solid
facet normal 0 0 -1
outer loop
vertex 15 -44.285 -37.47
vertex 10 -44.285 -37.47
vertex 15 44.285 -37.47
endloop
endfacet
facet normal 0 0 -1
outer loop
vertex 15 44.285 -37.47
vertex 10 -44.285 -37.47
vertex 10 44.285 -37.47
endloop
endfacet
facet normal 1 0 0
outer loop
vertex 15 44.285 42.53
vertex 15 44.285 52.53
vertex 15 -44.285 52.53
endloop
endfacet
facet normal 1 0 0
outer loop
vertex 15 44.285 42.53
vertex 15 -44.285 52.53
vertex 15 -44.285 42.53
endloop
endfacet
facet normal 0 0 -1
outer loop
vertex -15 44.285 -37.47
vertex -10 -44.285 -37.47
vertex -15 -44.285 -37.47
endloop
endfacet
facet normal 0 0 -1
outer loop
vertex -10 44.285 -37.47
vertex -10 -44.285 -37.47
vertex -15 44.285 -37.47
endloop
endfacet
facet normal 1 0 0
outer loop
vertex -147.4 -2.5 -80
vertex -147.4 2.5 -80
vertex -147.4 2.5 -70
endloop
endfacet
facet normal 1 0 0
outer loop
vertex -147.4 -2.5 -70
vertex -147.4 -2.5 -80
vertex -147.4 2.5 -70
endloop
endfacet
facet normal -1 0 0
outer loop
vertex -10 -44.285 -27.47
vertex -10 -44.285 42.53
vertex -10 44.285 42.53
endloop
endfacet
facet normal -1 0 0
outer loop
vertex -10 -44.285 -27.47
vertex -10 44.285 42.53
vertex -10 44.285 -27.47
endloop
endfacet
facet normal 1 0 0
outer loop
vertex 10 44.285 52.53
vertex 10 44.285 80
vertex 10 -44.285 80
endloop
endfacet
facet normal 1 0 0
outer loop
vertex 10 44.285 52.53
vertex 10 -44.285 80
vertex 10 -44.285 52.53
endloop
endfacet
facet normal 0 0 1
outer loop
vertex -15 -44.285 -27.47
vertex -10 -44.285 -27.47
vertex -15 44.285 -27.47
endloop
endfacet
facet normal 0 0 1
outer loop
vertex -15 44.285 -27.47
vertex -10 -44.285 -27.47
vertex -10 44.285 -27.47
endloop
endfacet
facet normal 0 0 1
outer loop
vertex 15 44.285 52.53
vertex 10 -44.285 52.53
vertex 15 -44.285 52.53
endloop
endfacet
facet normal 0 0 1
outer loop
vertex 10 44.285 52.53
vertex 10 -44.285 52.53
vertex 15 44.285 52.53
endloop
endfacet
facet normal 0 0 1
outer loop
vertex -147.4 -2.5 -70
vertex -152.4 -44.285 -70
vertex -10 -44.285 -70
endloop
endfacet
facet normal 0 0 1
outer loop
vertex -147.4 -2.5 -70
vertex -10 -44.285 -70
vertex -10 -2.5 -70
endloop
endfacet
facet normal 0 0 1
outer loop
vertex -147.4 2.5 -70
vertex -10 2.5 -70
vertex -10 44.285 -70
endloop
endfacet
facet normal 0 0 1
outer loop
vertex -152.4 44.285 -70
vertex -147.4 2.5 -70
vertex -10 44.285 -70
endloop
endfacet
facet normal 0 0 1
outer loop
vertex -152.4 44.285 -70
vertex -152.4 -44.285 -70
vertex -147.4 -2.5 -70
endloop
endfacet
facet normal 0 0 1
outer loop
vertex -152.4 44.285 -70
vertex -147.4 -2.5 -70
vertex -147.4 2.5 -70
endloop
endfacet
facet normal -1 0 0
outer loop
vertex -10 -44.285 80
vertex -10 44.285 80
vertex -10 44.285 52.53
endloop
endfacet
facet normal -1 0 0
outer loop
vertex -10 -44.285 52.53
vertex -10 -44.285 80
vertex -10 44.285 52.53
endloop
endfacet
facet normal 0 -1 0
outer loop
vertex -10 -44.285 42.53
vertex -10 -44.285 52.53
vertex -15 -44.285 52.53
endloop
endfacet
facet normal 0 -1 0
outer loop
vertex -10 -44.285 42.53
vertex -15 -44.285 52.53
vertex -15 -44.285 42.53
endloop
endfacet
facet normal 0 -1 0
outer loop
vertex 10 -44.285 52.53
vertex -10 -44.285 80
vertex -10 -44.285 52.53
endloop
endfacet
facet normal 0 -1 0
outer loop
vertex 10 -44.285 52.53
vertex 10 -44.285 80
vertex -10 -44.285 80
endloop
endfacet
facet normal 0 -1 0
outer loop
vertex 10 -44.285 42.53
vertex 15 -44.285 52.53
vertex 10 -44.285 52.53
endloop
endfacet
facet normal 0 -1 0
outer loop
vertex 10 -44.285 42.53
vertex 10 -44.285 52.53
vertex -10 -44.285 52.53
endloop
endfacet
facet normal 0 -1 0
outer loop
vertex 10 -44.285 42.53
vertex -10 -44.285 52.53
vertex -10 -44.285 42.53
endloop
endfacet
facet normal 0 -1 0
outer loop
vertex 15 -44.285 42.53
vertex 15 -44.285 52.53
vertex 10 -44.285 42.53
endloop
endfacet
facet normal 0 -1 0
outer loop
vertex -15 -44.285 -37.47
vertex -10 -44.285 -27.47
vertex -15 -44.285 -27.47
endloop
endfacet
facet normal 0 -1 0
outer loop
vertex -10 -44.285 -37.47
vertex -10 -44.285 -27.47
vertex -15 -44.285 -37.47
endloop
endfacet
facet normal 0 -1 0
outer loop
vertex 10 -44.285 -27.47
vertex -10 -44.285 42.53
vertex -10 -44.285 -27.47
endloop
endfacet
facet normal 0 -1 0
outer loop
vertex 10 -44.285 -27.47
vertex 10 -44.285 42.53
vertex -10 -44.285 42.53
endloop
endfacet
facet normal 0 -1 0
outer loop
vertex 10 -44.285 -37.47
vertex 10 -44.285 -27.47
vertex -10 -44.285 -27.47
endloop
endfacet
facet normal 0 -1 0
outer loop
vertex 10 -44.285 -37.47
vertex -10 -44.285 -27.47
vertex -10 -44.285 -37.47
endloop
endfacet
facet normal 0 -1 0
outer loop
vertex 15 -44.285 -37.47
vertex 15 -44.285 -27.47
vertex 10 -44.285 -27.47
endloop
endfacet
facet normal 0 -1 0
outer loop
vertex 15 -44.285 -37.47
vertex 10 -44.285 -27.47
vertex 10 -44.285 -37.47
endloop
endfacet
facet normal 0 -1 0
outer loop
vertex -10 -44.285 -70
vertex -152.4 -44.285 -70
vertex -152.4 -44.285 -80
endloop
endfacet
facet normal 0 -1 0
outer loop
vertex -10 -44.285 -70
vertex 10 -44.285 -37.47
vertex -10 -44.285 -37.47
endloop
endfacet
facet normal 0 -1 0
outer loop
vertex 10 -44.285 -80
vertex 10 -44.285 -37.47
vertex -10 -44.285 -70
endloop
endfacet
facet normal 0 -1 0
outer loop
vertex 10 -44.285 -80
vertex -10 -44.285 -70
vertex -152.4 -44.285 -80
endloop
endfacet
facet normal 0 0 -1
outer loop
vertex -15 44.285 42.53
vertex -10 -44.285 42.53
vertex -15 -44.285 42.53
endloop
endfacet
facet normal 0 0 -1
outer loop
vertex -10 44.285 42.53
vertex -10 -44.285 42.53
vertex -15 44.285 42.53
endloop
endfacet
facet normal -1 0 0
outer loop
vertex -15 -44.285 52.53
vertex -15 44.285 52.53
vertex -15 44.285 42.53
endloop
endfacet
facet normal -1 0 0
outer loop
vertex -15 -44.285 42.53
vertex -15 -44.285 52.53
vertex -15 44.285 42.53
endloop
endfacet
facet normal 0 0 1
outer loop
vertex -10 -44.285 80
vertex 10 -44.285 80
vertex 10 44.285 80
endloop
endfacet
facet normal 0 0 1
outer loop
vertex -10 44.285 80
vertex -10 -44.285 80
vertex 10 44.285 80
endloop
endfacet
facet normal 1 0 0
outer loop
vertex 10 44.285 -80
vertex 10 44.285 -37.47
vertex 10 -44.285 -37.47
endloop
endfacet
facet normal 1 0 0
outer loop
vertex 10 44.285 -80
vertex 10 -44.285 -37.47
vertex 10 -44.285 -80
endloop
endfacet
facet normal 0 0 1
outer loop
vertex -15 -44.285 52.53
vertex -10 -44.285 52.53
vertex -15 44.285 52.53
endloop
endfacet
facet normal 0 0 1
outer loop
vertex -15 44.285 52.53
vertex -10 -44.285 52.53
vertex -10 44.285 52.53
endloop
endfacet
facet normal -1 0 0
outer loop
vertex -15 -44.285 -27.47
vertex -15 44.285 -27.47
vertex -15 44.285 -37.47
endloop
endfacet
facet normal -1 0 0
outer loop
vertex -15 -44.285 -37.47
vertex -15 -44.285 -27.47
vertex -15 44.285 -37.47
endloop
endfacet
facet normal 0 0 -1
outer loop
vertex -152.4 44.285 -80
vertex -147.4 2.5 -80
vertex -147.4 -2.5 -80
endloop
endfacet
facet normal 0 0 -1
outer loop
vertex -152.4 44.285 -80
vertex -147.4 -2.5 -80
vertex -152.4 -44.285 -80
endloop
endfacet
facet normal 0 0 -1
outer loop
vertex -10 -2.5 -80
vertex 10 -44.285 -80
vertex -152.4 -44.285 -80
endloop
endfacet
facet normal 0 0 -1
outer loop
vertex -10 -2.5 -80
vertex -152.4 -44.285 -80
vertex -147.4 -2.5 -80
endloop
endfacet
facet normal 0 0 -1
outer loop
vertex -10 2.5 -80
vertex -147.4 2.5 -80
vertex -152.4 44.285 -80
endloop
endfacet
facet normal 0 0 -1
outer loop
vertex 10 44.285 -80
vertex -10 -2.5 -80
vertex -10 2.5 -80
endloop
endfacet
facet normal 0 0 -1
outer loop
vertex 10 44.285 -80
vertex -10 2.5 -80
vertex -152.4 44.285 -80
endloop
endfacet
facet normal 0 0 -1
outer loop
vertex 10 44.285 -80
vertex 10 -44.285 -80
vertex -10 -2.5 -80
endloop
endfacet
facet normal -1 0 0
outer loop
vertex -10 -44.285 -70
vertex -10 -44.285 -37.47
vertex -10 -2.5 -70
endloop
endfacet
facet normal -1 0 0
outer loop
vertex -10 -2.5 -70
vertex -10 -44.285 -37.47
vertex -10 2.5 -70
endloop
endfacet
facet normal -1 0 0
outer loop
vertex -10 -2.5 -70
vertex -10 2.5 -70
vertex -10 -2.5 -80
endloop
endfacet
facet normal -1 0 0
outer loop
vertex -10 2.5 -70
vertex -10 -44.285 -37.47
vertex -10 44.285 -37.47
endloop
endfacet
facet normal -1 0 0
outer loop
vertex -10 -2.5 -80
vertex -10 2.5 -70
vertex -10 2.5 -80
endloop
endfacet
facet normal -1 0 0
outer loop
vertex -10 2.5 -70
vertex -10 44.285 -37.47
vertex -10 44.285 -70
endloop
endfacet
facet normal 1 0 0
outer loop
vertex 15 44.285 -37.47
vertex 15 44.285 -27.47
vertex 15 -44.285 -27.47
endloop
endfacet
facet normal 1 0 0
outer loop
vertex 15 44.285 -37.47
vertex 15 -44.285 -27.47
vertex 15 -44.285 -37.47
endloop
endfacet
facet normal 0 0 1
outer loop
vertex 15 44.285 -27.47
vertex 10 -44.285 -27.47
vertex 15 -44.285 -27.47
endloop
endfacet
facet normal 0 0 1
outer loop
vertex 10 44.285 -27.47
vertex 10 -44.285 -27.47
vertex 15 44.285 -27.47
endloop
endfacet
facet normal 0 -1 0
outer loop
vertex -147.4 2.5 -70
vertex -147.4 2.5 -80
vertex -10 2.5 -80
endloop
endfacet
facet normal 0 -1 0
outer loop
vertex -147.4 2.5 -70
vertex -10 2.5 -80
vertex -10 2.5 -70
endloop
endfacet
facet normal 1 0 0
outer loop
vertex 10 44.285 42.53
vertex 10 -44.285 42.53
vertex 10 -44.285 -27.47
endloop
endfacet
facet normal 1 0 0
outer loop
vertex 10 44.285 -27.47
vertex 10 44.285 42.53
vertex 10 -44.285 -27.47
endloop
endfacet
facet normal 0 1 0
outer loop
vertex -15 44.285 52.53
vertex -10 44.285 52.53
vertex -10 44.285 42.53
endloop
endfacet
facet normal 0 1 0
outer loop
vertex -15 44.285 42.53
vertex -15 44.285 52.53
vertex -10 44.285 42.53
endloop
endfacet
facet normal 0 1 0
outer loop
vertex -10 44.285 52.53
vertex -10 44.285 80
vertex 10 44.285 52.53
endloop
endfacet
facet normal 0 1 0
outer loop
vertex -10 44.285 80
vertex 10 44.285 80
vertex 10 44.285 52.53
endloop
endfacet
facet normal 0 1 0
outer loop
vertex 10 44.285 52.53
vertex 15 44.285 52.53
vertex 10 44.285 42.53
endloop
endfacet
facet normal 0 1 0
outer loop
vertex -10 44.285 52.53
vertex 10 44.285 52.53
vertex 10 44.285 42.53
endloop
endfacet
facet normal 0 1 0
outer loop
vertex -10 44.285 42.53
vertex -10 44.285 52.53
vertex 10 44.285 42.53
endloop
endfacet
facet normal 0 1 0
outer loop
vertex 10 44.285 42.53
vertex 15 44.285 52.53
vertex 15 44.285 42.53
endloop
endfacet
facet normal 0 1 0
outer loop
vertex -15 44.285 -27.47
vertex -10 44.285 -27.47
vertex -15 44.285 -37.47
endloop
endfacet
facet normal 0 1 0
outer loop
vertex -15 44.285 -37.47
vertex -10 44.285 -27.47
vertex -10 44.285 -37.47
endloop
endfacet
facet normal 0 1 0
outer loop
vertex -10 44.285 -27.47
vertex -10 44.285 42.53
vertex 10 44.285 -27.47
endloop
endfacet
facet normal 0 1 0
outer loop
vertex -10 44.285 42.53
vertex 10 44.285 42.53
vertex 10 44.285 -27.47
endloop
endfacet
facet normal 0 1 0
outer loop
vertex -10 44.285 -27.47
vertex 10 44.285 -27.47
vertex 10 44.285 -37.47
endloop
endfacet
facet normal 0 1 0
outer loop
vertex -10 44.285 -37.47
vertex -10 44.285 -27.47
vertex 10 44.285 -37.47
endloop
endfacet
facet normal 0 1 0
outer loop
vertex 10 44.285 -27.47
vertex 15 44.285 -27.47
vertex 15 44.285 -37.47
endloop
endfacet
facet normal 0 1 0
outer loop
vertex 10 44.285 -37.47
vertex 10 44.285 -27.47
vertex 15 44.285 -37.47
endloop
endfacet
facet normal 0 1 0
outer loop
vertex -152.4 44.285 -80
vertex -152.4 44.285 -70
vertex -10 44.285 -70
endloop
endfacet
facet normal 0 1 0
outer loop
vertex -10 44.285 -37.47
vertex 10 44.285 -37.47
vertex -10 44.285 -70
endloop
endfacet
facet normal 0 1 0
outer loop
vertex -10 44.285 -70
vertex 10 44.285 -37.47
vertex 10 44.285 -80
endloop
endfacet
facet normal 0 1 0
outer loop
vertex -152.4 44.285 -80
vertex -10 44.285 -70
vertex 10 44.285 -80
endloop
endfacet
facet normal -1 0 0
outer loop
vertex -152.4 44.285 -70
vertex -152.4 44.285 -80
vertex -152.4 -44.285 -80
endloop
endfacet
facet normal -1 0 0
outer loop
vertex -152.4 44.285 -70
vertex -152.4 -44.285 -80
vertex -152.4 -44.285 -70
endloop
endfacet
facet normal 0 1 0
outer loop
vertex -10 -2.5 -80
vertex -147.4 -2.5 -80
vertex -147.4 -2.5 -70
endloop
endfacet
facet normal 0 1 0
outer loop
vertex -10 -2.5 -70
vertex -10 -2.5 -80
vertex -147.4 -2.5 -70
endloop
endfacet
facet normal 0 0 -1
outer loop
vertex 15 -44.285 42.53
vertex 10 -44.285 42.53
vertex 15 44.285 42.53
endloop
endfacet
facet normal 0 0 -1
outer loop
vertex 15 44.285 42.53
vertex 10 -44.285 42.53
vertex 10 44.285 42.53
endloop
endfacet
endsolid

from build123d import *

# Parameters (mm, degrees)
SKETCH2_W           = 160
SKETCH2_H           = 88.569233124
BOSS_EXTRUDE1_DEPTH = 10
SKETCH3_W           = 10
SKETCH3_H           = 88.569233124
BOSS_EXTRUDE2_DEPTH = 152.4
SKETCH4_W           = 10
SKETCH4_H           = 5
CUT_EXTRUDE6_DEPTH  = 152.4
SKETCH4_2_W         = 10
SKETCH4_2_H         = 5
BOSS_EXTRUDE3_DEPTH = 5
SKETCH6_W           = 10
SKETCH6_H           = 88.569233124
BOSS_EXTRUDE4_DEPTH = 5


with BuildPart() as part:
    # Sketch2 → Boss-Extrude1 (new body)
    with BuildSketch(Plane(origin=(0, 0, 0), x_dir=(0, 0, -1), z_dir=(1, 0, 0))):
        Rectangle(SKETCH2_W, SKETCH2_H)
    boss_extrude1 = extrude(amount=BOSS_EXTRUDE1_DEPTH)

    # Sketch3 → Boss-Extrude2 (add)
    with BuildSketch(Plane.ZY):
        with Locations((-75, 0)):
            Rectangle(SKETCH3_W, SKETCH3_H)
    extrude(amount=BOSS_EXTRUDE2_DEPTH)

    # Sketch4 → Cut-Extrude6 (cut)
    with BuildSketch(Plane.ZY.offset(152.4)):
        with Locations((-75, 0)):
            Rectangle(SKETCH4_W, SKETCH4_H)
    extrude(amount=-CUT_EXTRUDE6_DEPTH, mode=Mode.SUBTRACT)

    # Sketch4<2> → Boss-Extrude3 (add)
    with BuildSketch(Plane.ZY.offset(152.4)):
        with Locations((-75, 0)):
            Rectangle(SKETCH4_2_W, SKETCH4_2_H)
    extrude(amount=-BOSS_EXTRUDE3_DEPTH)

    # Sketch6 → Boss-Extrude4 (add)
    with BuildSketch(Plane(origin=(10, 0, 0), x_dir=(0, 0, -1), z_dir=(1, 0, 0))):
        with Locations((32.47, 0)):
            Rectangle(SKETCH6_W, SKETCH6_H)
        with Locations((-47.53, 0)):
            Rectangle(SKETCH6_W, SKETCH6_H)
    boss_extrude4 = extrude(amount=BOSS_EXTRUDE4_DEPTH)

    # Mirror2: Boss-Extrude1, Boss-Extrude4 across plane
    add(boss_extrude1.mirror(Plane(origin=(0, 0, 0), x_dir=(0, 0, 1), z_dir=(1, 0, 0))))
    add(boss_extrude4.mirror(Plane(origin=(0, 0, 0), x_dir=(0, 0, 1), z_dir=(1, 0, 0))))


solid = part.part
